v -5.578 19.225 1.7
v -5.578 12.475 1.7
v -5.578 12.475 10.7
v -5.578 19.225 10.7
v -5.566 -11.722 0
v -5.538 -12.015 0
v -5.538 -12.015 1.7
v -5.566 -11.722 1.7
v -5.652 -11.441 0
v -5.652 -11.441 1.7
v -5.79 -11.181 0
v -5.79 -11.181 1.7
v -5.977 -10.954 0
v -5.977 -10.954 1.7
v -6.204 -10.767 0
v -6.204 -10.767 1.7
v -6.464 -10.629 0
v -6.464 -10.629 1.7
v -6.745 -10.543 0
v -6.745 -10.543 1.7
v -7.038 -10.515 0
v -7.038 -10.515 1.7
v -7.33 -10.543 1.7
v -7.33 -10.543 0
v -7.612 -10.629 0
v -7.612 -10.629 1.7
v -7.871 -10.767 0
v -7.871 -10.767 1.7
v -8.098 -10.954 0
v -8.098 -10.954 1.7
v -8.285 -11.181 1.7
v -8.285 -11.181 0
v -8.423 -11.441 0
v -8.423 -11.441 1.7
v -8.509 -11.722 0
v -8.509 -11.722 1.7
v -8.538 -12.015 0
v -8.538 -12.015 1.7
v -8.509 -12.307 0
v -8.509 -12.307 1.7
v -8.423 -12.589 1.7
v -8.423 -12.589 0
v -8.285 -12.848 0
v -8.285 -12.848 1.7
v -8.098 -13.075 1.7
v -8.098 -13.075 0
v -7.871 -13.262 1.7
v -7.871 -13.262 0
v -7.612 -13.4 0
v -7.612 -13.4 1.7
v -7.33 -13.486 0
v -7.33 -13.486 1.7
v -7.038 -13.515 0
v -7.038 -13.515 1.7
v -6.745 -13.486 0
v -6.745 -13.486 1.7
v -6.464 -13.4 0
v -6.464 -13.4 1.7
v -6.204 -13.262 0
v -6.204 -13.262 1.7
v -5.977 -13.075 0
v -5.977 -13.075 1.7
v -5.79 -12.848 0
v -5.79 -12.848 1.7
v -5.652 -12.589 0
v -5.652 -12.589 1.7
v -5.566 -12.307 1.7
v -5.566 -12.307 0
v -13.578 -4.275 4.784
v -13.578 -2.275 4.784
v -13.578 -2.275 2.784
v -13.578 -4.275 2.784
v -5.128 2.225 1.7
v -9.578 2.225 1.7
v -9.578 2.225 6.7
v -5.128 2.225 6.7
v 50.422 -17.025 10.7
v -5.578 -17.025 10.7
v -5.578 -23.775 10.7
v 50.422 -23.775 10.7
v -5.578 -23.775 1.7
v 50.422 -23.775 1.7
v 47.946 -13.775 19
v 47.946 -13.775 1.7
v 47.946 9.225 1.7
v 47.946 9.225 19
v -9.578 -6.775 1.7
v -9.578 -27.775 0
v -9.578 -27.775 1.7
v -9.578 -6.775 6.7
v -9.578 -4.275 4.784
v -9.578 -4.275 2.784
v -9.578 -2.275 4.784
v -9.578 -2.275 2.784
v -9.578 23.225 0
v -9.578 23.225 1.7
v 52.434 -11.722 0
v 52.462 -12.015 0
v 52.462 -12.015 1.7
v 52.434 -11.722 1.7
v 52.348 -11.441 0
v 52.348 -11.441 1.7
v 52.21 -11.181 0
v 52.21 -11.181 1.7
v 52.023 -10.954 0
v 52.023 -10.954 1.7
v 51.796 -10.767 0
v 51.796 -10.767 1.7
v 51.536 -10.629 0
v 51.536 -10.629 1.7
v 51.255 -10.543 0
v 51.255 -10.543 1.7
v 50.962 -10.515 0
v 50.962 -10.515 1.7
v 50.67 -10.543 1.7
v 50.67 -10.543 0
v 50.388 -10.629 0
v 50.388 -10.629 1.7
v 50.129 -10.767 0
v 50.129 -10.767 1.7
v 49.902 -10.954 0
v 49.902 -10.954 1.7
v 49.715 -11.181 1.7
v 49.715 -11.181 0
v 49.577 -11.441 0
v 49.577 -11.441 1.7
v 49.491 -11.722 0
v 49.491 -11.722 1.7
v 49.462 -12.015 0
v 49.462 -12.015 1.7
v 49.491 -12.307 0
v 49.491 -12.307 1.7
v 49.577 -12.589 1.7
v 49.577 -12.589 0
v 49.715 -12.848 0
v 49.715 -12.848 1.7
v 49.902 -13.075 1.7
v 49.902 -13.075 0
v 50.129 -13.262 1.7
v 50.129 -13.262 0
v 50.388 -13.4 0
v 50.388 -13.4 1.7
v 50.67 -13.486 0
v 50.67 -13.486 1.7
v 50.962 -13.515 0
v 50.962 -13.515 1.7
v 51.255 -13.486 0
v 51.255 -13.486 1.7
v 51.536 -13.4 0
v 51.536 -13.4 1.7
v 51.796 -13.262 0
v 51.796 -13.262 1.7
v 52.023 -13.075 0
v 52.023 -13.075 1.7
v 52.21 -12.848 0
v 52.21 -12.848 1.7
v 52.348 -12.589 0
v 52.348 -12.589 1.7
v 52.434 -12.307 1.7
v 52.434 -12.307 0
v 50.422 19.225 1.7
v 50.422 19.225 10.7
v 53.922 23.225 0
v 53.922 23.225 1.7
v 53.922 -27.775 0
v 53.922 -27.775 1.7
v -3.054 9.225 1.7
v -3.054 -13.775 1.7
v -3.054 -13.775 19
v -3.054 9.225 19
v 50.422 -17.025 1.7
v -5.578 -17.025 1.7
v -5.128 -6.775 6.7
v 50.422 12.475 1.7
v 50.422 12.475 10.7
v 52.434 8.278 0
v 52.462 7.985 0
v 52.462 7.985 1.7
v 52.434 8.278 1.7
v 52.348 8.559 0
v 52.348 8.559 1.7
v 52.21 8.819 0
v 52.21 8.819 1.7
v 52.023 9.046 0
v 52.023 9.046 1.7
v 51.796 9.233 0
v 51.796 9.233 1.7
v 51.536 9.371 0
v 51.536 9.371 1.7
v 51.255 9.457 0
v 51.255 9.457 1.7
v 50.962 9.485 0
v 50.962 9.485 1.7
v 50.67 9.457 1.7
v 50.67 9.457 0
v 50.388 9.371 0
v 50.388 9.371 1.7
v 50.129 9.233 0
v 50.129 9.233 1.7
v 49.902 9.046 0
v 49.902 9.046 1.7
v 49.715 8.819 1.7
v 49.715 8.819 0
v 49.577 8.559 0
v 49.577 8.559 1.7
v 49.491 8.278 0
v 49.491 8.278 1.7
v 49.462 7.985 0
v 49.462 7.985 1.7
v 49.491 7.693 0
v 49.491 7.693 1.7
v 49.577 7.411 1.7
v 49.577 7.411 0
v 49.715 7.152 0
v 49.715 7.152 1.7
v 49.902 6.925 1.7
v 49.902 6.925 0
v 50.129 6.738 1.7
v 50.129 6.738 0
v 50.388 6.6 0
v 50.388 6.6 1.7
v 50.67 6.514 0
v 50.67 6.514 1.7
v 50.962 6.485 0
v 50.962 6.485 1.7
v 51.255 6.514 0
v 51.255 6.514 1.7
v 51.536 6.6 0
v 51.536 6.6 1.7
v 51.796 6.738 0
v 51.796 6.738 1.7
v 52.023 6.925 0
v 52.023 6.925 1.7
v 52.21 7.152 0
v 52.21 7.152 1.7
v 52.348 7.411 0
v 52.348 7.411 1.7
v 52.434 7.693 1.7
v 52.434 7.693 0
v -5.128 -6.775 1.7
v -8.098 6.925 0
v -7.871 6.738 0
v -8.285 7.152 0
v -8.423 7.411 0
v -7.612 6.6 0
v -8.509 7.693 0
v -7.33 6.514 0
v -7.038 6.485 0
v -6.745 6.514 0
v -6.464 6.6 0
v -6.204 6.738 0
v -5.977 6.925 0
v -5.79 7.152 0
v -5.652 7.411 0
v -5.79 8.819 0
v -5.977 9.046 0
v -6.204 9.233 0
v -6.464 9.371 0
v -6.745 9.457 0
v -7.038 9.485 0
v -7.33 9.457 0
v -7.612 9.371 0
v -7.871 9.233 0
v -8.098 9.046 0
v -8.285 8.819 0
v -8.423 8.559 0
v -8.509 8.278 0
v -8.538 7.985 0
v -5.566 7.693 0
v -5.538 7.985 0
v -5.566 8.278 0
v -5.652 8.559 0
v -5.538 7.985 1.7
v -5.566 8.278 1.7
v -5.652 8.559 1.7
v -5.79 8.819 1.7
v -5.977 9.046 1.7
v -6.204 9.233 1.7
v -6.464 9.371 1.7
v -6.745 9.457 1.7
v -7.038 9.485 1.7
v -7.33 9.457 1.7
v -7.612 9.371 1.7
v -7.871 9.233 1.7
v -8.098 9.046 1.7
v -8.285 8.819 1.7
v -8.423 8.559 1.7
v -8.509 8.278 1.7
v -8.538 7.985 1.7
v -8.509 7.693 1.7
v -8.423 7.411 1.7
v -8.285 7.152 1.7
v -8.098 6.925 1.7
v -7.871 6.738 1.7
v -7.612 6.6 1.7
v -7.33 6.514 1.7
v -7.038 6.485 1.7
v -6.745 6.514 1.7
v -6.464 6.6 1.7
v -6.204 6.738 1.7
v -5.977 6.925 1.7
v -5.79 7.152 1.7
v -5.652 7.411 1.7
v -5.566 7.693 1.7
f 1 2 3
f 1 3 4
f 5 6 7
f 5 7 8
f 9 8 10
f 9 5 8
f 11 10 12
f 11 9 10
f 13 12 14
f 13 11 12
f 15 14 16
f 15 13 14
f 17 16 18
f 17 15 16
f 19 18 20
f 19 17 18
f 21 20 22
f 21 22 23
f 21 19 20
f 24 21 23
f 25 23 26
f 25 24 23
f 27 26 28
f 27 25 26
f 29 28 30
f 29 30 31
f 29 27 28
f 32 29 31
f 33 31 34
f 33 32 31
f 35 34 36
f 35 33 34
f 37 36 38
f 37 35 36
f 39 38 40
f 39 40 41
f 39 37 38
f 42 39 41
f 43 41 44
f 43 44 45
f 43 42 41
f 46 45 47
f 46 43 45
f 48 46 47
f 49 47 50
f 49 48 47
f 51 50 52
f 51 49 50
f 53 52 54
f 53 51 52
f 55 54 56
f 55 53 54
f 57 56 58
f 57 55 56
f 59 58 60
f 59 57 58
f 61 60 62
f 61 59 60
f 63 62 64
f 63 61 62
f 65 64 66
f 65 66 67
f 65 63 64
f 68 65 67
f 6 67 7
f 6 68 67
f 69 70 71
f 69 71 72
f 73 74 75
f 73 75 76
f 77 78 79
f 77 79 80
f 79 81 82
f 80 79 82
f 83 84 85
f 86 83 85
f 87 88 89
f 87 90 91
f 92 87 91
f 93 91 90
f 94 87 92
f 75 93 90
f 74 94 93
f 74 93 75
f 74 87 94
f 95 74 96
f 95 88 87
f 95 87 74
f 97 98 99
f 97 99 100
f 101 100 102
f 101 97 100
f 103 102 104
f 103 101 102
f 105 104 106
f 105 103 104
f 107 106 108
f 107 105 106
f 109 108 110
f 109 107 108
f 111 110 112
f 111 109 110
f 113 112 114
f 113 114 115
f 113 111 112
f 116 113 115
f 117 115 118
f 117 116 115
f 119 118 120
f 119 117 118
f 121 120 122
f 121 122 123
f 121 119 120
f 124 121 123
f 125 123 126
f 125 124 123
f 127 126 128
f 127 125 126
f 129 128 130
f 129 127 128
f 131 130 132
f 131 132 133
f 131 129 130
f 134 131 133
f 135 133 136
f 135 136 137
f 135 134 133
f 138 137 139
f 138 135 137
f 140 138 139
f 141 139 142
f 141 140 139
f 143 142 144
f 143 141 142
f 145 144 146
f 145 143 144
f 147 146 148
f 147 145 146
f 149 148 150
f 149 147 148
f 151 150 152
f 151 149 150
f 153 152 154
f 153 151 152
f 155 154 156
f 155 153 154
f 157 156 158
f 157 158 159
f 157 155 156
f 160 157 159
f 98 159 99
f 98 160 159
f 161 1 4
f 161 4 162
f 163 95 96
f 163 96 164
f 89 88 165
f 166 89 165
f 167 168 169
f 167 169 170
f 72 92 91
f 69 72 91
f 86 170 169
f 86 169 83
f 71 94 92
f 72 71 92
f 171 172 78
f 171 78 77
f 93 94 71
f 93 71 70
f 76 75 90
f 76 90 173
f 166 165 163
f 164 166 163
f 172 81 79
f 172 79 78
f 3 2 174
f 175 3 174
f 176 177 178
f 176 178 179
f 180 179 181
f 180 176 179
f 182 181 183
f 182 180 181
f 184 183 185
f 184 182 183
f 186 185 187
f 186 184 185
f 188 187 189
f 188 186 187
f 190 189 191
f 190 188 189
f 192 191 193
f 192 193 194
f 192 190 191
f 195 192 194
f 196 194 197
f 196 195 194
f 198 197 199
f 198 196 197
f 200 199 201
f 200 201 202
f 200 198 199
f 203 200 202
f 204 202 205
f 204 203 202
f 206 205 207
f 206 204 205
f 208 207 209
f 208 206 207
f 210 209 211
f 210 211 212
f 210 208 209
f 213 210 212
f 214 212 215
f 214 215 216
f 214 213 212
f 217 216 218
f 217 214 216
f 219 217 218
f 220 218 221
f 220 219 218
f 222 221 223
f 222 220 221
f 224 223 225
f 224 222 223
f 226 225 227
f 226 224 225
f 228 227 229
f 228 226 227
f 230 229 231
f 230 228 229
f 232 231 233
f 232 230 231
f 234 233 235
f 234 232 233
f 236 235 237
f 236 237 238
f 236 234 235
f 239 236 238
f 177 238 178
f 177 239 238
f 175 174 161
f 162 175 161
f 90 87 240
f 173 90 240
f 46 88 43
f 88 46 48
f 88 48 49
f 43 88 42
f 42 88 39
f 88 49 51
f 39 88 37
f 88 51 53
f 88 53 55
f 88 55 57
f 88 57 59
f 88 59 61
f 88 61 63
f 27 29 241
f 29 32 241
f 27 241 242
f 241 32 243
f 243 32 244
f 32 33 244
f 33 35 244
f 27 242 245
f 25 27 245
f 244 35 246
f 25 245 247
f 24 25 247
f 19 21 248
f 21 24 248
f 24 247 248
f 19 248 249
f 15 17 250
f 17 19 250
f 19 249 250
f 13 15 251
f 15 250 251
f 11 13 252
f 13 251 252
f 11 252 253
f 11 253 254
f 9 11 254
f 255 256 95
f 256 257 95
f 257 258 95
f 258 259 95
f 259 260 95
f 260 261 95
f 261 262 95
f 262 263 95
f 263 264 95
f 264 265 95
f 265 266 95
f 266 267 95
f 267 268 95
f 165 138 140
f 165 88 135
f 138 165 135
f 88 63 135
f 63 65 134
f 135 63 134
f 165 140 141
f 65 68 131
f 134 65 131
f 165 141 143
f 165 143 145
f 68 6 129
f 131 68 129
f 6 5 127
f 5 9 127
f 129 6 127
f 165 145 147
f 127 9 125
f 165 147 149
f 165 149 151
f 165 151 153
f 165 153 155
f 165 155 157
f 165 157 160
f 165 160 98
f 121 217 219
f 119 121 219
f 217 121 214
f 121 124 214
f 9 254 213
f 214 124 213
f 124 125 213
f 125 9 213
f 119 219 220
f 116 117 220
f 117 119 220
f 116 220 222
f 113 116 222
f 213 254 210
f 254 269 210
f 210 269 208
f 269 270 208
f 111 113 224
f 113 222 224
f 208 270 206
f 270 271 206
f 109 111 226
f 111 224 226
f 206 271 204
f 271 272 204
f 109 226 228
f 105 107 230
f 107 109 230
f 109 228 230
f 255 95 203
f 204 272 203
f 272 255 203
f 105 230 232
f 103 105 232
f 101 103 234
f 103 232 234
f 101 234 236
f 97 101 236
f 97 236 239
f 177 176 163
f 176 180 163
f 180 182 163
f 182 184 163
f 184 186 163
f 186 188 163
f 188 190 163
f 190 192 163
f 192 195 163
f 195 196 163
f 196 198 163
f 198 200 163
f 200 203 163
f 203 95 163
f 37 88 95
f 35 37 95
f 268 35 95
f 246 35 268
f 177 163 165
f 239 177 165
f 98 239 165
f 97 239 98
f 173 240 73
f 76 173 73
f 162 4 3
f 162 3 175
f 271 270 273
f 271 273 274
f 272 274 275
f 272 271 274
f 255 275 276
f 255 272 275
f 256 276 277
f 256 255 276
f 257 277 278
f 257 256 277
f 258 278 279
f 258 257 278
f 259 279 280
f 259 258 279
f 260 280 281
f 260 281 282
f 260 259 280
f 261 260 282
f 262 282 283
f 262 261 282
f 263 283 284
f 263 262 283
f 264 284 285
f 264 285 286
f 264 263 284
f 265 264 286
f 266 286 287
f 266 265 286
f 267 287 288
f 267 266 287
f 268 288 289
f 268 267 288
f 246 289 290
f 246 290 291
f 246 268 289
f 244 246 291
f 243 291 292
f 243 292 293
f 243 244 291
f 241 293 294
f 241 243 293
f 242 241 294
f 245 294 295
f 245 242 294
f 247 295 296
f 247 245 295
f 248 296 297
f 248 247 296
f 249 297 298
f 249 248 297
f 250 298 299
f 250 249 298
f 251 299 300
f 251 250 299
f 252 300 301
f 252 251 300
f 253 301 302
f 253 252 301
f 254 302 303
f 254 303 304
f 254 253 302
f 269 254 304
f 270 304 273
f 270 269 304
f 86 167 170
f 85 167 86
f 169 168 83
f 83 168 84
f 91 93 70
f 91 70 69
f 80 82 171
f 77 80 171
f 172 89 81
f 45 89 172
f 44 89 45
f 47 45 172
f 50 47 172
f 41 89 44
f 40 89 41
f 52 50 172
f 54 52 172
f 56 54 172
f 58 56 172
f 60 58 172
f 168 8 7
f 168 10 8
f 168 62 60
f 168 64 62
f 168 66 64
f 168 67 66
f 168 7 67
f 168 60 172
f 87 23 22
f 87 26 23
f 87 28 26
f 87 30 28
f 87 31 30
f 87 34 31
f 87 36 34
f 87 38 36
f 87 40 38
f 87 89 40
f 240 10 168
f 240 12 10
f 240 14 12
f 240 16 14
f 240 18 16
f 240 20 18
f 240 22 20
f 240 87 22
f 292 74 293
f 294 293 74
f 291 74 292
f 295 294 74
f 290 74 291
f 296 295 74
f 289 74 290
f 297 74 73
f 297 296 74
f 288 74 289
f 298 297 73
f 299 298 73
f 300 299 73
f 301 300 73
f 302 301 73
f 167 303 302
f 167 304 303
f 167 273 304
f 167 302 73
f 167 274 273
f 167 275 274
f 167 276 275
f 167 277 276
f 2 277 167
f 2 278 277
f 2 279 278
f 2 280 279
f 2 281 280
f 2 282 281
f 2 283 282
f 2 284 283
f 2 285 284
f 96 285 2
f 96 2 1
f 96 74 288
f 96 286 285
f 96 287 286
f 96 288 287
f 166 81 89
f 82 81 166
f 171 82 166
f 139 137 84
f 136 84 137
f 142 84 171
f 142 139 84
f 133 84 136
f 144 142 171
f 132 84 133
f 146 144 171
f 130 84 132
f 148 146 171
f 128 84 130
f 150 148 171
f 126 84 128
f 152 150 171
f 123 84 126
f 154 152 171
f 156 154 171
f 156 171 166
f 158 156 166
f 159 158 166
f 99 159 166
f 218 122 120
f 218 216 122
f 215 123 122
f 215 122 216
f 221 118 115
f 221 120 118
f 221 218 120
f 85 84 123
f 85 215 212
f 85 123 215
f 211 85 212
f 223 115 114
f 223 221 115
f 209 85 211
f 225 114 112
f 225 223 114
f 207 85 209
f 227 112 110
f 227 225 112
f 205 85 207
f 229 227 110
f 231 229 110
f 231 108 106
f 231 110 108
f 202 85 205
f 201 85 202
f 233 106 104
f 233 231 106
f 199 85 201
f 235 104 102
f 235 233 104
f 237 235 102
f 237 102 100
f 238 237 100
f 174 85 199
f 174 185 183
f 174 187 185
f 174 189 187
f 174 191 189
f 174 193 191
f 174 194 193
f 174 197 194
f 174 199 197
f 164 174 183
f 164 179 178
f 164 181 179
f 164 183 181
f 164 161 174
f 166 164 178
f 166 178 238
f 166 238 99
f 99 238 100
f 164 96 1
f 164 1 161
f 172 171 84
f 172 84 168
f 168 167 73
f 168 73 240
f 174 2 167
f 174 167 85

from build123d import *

# Parameters (mm, degrees)
F4_W      = 63.5
F4_H      = 51
F4_R      = 1.5
F5_DEPTH  = 1.7
F6_W      = 51
F6_H      = 23
F7_DEPTH  = 17.3
F6_W_2    = 56
F6_H_2    = 6.75
F8_DEPTH  = 9
F6_W_3    = 4.45
F6_H_3    = 9
F9_DEPTH  = 5
F10_W     = 2
F10_H     = 2
F11_DEPTH = 4


with BuildPart() as f5:
    # F4 (on Top) → F5 (new body)
    with BuildSketch(Plane.XY):
        with Locations((22.1723487377, -2.2746226639)):
            Rectangle(F4_W, F4_H)
        with Locations((-7.0376512623, -12.0146226639)):
            Circle(F4_R, mode=Mode.SUBTRACT)
        with Locations((50.9623487377, -12.0146226639)):
            Circle(F4_R, mode=Mode.SUBTRACT)
        with Locations((-7.0376512623, 7.9853773361)):
            Circle(F4_R, mode=Mode.SUBTRACT)
        with Locations((50.9623487377, 7.9853773361)):
            Circle(F4_R, mode=Mode.SUBTRACT)
    extrude(amount=F5_DEPTH)

    # F6 (on face) → F7 (join)
    with BuildSketch(Plane.XY.offset(1.7)):
        with Locations((22.4463341404, -2.2746226639)):
            Rectangle(F6_W, F6_H)
    extrude(amount=F7_DEPTH)

    # F6 (on face) → F8 (join)
    with BuildSketch(Plane.XY.offset(1.7)):
        with Locations((22.4223487377, 15.8503773361)):
            Rectangle(F6_W_2, F6_H_2)
        with Locations((22.4223487377, -20.3996226639)):
            Rectangle(F6_W_2, F6_H_2)
    extrude(amount=F8_DEPTH)

    # F6 (on face) → F9 (join)
    with BuildSketch(Plane.XY.offset(1.7)):
        with Locations((-7.3526512623, -2.2746226639)):
            Rectangle(F6_W_3, F6_H_3)
    extrude(amount=F9_DEPTH)

    # F10 (on face) → F11 (join)
    with BuildSketch(Plane(origin=(-9.5776512623, 0, 0), x_dir=(0, -1, 0), z_dir=(-1, 0, 0))):
        with Locations((3.2746226639, 3.7837546077)):
            Rectangle(F10_W, F10_H)
    extrude(amount=F11_DEPTH)


solid = f5.part
